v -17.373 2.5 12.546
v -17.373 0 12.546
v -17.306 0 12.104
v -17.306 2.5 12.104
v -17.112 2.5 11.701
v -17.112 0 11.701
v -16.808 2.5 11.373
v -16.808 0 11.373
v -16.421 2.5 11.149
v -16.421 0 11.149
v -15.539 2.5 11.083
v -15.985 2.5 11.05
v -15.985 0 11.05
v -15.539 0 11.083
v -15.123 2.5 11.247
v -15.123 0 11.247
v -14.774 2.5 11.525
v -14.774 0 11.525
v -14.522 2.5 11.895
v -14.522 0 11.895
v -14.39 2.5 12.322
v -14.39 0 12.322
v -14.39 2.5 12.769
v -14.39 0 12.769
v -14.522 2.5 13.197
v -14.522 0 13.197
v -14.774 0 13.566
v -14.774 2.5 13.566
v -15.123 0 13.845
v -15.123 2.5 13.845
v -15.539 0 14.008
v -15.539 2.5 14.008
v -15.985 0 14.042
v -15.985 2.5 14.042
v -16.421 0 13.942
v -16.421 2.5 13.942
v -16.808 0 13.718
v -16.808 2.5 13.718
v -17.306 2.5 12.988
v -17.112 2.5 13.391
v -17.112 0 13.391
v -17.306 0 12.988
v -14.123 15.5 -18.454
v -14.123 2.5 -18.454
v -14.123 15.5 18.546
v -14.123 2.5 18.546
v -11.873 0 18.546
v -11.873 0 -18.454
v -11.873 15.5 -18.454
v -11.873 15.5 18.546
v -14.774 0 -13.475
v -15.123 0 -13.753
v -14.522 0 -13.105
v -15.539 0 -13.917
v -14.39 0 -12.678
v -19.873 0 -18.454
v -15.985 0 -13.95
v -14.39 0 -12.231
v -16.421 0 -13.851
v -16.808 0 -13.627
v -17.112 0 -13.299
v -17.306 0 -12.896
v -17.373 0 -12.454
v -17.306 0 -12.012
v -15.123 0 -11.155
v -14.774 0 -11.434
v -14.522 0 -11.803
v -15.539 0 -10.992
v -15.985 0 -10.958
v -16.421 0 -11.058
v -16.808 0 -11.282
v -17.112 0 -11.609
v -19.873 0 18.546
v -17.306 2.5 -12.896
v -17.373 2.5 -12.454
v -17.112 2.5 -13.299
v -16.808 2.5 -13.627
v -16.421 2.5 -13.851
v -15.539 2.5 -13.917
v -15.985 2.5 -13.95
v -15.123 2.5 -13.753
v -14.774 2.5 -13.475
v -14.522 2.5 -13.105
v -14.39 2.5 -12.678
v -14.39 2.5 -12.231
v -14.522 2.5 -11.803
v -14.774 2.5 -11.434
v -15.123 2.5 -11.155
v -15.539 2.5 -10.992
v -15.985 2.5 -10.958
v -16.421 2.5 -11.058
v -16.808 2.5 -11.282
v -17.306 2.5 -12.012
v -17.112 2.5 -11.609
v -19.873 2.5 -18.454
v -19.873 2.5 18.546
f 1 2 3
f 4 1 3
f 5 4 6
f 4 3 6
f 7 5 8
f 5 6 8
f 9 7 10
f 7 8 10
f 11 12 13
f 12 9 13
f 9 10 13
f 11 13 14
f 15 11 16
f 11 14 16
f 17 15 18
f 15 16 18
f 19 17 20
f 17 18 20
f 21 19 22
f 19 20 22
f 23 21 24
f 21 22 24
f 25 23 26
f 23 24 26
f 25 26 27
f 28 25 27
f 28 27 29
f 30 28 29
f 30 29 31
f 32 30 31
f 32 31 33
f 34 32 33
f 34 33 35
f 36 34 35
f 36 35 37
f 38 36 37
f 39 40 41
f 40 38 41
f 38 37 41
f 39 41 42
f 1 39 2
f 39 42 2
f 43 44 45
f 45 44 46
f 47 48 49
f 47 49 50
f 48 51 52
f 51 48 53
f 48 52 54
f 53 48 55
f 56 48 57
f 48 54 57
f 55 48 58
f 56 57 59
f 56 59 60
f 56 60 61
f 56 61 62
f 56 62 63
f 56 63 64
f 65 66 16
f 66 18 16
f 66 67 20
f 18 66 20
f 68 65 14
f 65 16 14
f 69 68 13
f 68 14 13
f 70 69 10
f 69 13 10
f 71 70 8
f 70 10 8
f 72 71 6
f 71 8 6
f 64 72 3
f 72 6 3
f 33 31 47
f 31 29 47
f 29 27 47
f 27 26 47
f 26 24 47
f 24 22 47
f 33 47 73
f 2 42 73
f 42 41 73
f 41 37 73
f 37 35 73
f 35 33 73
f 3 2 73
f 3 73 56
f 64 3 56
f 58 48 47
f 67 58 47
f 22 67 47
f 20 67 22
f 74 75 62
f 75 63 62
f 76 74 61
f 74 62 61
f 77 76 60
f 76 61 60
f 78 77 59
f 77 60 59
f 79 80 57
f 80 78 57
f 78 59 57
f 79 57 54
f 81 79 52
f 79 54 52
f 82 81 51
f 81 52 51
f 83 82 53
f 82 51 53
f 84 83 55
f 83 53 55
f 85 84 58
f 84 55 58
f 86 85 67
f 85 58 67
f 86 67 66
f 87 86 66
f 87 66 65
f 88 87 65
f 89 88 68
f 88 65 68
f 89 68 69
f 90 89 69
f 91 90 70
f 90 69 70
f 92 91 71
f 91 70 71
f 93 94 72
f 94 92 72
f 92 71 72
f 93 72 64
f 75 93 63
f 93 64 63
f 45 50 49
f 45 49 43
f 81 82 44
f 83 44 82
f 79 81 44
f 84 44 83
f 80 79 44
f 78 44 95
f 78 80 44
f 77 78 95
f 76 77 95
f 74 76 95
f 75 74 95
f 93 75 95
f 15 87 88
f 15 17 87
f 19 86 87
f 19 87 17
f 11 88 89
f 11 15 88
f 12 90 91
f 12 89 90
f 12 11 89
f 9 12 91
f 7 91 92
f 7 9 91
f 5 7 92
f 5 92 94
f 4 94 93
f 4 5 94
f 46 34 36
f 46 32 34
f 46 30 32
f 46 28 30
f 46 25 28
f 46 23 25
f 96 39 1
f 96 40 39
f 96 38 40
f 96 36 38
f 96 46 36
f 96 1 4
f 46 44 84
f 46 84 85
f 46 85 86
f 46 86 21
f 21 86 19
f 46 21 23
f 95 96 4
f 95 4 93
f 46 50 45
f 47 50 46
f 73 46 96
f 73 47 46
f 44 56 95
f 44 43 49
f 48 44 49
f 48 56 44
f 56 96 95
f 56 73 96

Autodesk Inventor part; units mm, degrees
ref_plane "YZ Plane" through (0, 0, 0) normal (1, 0, 0) x (0, 1, 0)
ref_plane "XZ Plane" through (0, 0, 0) normal (0, 1, 0) x (-1, 0, 0)
ref_plane "XY Plane" through (0, 0, 0) normal (0, 0, 1) x (1, 0, 0)
sketch "Esboço1" plane through (0, 0, 0) normal (0, 1, 0) x (-1, 0, 0)
  line L0 (11.8731, -18.4543) -> (11.8731, 18.5457)
  line L1 (11.8731, 18.5457) -> (19.8731, 18.5457)
  line L2 (19.8731, 18.5457) -> (19.8731, -18.4543)
  line L3 (19.8731, -18.4543) -> (11.8731, -18.4543)
  line L4 (11.8731, -18.4543) -> (11.8731, 18.5457)
  circle A0 centre (15.8731, 12.5457) radius 1.5
  circle A1 centre (15.8731, -12.4543) radius 1.5
  line L5 (14.1231, -18.4543) -> (14.1231, 18.5457)
  point P0 (15.8731, 18.5457)
  point P1 (15.8731, -18.4543)
  dimension "d2" = 8
  dimension "d3" = 3
  dimension "d5" = 6
  dimension "d6" = 6
  dimension "d8" = 4
  dimension "d9" = 2.25
  dimension "d10" = 3
extrude "Extrusão1" add sketch "Esboço1" along normal blind 2.5 contours L5 L1 L2 L3
extrude "Extrusão2" add sketch "Esboço1" along normal blind 15.5 contours L0 L1 L5 L3
properties part number "pecinha_empunhadura"
